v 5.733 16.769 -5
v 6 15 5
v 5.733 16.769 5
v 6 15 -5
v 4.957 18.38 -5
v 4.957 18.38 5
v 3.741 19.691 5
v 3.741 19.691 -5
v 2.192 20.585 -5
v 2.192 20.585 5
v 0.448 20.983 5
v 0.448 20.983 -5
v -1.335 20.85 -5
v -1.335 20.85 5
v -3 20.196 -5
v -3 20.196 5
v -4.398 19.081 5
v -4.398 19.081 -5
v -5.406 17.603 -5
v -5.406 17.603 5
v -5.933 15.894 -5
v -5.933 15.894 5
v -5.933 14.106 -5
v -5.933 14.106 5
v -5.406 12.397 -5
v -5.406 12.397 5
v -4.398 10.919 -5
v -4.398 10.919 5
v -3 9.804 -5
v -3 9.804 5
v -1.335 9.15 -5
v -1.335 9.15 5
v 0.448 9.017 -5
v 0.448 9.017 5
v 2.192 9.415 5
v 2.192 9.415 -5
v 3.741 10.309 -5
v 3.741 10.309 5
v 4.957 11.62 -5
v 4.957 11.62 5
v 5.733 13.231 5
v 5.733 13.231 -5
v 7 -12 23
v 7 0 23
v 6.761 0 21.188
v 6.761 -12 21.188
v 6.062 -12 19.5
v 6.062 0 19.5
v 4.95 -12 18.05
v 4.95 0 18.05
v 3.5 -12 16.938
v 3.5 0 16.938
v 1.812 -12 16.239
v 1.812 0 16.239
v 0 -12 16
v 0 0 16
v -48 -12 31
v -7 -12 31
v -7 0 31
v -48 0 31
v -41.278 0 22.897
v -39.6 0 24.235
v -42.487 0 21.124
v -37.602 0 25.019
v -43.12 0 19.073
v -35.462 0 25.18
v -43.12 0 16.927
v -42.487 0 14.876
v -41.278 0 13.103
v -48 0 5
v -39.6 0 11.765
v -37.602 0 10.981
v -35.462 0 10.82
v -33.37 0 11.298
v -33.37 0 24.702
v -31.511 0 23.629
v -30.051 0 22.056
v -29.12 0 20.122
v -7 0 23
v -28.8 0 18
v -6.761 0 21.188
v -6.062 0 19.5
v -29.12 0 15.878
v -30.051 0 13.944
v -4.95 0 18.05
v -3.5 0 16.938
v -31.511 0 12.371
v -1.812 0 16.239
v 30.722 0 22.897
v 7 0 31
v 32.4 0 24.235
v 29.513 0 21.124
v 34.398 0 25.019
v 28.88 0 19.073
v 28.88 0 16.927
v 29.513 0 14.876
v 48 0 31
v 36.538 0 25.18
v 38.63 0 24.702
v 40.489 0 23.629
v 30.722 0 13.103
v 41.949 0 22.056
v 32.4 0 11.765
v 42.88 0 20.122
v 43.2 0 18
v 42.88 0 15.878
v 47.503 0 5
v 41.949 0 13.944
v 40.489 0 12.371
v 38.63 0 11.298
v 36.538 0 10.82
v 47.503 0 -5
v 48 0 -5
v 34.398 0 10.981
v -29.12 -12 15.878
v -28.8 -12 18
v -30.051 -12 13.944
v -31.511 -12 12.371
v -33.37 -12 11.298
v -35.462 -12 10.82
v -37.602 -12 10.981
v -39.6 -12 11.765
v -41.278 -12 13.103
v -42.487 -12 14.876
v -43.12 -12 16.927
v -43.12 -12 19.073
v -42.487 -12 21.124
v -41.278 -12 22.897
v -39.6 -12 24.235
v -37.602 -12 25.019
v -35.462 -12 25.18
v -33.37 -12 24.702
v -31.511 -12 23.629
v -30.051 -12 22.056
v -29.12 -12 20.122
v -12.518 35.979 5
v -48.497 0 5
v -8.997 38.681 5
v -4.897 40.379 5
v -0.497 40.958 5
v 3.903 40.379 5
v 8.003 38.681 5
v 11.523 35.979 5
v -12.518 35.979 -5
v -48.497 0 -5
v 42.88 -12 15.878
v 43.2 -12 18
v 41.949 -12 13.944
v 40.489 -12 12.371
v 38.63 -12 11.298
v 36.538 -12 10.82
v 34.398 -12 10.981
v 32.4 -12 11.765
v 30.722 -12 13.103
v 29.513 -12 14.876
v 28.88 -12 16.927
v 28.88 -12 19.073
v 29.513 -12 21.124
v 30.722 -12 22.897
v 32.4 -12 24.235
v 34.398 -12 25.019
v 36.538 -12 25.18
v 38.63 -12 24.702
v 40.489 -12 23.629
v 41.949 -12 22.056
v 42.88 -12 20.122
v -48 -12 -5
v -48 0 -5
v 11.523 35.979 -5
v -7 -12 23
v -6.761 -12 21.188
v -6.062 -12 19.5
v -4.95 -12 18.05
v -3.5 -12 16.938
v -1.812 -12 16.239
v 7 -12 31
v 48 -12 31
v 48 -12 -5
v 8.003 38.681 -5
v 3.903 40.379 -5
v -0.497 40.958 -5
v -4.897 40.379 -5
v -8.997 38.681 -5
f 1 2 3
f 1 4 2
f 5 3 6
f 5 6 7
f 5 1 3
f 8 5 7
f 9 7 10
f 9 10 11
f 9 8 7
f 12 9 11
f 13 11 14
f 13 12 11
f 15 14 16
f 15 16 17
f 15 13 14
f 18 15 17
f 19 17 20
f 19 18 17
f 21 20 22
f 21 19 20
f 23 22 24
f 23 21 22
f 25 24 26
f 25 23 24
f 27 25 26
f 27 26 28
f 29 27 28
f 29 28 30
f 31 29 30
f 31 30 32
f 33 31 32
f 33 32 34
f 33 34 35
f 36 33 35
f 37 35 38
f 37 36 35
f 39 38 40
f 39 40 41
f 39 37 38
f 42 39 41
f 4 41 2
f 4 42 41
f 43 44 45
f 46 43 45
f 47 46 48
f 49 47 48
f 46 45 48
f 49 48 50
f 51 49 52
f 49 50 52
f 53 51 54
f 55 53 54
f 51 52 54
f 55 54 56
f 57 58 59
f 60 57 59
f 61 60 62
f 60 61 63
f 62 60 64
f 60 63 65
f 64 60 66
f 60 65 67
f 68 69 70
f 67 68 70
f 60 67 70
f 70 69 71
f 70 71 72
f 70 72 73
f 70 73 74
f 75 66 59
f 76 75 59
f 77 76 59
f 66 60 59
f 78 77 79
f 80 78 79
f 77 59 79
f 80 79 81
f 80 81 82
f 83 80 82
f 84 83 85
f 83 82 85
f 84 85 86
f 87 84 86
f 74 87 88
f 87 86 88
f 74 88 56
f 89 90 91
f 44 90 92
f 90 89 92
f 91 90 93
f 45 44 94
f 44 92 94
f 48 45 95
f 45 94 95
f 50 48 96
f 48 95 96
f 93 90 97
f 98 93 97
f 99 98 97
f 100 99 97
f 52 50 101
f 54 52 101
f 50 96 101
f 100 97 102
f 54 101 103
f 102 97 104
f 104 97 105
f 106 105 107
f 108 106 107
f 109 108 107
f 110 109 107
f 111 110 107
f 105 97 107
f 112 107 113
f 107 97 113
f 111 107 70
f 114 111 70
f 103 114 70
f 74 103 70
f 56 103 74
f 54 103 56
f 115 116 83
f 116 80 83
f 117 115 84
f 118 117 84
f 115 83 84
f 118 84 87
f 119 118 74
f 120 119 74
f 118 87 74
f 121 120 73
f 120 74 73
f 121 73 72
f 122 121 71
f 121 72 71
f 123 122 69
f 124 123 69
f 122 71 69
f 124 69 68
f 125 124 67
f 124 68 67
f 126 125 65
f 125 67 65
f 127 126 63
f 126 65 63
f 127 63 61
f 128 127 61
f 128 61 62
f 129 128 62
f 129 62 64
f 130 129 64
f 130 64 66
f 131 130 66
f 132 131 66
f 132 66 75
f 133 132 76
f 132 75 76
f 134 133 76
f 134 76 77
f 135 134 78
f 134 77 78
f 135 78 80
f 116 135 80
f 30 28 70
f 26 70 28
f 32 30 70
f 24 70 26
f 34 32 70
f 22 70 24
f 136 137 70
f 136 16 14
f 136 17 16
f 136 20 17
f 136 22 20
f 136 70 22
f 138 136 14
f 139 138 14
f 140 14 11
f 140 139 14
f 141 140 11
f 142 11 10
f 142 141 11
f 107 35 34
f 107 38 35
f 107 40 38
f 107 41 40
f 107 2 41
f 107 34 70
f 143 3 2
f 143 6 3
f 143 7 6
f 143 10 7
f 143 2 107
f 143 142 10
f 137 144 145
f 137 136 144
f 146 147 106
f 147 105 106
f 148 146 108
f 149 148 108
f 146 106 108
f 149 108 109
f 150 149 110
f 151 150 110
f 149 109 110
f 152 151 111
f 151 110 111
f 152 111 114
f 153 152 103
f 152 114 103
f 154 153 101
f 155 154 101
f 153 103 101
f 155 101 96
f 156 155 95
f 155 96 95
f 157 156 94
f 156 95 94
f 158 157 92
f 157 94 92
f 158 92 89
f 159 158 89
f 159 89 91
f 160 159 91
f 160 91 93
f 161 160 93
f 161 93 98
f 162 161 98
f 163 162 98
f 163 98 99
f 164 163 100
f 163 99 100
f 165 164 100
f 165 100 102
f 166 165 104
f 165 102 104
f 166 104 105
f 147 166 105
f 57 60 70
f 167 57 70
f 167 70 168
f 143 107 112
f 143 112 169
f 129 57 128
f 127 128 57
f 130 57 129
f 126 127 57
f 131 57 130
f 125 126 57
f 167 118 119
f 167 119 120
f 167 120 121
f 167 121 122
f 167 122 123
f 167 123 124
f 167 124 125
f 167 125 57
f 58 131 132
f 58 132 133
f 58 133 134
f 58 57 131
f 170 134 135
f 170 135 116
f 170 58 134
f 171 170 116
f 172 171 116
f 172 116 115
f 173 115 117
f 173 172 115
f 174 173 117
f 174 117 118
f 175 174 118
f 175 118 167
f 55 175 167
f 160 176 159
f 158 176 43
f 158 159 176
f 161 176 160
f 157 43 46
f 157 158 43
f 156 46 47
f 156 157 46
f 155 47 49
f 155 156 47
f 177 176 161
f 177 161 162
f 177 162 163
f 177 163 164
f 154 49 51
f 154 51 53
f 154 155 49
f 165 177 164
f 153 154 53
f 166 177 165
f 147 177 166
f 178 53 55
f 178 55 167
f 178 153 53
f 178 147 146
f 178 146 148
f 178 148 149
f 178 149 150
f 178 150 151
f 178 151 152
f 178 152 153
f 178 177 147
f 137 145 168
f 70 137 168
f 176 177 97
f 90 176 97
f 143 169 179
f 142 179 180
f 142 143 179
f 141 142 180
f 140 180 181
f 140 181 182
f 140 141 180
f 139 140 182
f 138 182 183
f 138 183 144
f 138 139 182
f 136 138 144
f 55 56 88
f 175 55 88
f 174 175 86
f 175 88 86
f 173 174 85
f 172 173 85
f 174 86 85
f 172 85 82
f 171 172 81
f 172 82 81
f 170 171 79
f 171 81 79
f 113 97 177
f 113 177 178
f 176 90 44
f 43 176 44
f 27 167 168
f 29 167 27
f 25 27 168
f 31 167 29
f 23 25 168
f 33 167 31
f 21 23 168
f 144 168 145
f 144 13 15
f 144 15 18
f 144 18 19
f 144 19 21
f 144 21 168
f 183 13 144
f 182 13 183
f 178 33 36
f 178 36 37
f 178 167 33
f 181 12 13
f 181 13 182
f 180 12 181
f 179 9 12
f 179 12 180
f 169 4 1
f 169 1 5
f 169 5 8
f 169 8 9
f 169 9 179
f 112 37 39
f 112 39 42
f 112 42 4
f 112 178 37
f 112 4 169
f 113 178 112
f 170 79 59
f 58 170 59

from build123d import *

# Parameters (mm, degrees)
SKETCH1_R           = 6
BOSS_EXTRUDE2_DEPTH = 5
SKETCH2_W           = 36
SKETCH2_H           = 12
BOSS_EXTRUDE3_DEPTH = 48
CUT_EXTRUDE1_DEPTH  = 48
SKETCH4_R           = 7.2
CUT_EXTRUDE2_DEPTH  = 48
SKETCH5_R           = 7.2
CUT_EXTRUDE3_DEPTH  = 48


with BuildPart() as part:
    # Sketch1 → Boss-Extrude2 (new body, symmetric)
    with BuildSketch(Plane.XY):
        with BuildLine():
            Line((-48.497409326, 0), (47.502590674, 0))
            Line((47.502590674, 0), (11.523405954, 35.97918472))
            ThreePointArc((11.523405954, 35.97918472), (-0.497409326, 40.95836944), (-12.518224607, 35.97918472))
            Line((-12.518224607, 35.97918472), (-48.497409326, 0))
        make_face()
        with Locations((0, 15)):
            Circle(SKETCH1_R, mode=Mode.SUBTRACT)
    extrude(amount=BOSS_EXTRUDE2_DEPTH, both=True)

    # Sketch2 → Boss-Extrude3 (add, symmetric)
    with BuildSketch(Plane(origin=(0, 0, 0), x_dir=(0, 0, -1), z_dir=(1, 0, 0))):
        with Locations((-13, -6)):
            Rectangle(SKETCH2_W, SKETCH2_H)
    extrude(amount=BOSS_EXTRUDE3_DEPTH, both=True)

    # Sketch3 → Cut-Extrude1 (cut, symmetric)
    with BuildSketch(Plane(origin=(0, 0, 0), x_dir=(1, 0, 0), z_dir=(0, 1, 0))):
        with BuildLine():
            Line((-7, -23), (-7, -31))
            Line((-7, -31), (7, -31))
            Line((7, -31), (7, -23))
            ThreePointArc((7, -23), (4.949747468, -18.050252532), (0, -16))
            ThreePointArc((0, -16), (-4.949747468, -18.050252532), (-7, -23))
        make_face()
    extrude(amount=CUT_EXTRUDE1_DEPTH, both=True, mode=Mode.SUBTRACT)

    # Sketch4 → Cut-Extrude2 (cut, symmetric)
    with BuildSketch(Plane(origin=(0, 0, 0), x_dir=(1, 0, 0), z_dir=(0, 1, 0))):
        with Locations((-36, -18)):
            Circle(SKETCH4_R)
    extrude(amount=CUT_EXTRUDE2_DEPTH, both=True, mode=Mode.SUBTRACT)

    # Sketch5 → Cut-Extrude3 (cut, symmetric)
    with BuildSketch(Plane(origin=(0, 0, 0), x_dir=(1, 0, 0), z_dir=(0, 1, 0))):
        with Locations((36, -18)):
            Circle(SKETCH5_R)
    extrude(amount=CUT_EXTRUDE3_DEPTH, both=True, mode=Mode.SUBTRACT)


solid = part.part
